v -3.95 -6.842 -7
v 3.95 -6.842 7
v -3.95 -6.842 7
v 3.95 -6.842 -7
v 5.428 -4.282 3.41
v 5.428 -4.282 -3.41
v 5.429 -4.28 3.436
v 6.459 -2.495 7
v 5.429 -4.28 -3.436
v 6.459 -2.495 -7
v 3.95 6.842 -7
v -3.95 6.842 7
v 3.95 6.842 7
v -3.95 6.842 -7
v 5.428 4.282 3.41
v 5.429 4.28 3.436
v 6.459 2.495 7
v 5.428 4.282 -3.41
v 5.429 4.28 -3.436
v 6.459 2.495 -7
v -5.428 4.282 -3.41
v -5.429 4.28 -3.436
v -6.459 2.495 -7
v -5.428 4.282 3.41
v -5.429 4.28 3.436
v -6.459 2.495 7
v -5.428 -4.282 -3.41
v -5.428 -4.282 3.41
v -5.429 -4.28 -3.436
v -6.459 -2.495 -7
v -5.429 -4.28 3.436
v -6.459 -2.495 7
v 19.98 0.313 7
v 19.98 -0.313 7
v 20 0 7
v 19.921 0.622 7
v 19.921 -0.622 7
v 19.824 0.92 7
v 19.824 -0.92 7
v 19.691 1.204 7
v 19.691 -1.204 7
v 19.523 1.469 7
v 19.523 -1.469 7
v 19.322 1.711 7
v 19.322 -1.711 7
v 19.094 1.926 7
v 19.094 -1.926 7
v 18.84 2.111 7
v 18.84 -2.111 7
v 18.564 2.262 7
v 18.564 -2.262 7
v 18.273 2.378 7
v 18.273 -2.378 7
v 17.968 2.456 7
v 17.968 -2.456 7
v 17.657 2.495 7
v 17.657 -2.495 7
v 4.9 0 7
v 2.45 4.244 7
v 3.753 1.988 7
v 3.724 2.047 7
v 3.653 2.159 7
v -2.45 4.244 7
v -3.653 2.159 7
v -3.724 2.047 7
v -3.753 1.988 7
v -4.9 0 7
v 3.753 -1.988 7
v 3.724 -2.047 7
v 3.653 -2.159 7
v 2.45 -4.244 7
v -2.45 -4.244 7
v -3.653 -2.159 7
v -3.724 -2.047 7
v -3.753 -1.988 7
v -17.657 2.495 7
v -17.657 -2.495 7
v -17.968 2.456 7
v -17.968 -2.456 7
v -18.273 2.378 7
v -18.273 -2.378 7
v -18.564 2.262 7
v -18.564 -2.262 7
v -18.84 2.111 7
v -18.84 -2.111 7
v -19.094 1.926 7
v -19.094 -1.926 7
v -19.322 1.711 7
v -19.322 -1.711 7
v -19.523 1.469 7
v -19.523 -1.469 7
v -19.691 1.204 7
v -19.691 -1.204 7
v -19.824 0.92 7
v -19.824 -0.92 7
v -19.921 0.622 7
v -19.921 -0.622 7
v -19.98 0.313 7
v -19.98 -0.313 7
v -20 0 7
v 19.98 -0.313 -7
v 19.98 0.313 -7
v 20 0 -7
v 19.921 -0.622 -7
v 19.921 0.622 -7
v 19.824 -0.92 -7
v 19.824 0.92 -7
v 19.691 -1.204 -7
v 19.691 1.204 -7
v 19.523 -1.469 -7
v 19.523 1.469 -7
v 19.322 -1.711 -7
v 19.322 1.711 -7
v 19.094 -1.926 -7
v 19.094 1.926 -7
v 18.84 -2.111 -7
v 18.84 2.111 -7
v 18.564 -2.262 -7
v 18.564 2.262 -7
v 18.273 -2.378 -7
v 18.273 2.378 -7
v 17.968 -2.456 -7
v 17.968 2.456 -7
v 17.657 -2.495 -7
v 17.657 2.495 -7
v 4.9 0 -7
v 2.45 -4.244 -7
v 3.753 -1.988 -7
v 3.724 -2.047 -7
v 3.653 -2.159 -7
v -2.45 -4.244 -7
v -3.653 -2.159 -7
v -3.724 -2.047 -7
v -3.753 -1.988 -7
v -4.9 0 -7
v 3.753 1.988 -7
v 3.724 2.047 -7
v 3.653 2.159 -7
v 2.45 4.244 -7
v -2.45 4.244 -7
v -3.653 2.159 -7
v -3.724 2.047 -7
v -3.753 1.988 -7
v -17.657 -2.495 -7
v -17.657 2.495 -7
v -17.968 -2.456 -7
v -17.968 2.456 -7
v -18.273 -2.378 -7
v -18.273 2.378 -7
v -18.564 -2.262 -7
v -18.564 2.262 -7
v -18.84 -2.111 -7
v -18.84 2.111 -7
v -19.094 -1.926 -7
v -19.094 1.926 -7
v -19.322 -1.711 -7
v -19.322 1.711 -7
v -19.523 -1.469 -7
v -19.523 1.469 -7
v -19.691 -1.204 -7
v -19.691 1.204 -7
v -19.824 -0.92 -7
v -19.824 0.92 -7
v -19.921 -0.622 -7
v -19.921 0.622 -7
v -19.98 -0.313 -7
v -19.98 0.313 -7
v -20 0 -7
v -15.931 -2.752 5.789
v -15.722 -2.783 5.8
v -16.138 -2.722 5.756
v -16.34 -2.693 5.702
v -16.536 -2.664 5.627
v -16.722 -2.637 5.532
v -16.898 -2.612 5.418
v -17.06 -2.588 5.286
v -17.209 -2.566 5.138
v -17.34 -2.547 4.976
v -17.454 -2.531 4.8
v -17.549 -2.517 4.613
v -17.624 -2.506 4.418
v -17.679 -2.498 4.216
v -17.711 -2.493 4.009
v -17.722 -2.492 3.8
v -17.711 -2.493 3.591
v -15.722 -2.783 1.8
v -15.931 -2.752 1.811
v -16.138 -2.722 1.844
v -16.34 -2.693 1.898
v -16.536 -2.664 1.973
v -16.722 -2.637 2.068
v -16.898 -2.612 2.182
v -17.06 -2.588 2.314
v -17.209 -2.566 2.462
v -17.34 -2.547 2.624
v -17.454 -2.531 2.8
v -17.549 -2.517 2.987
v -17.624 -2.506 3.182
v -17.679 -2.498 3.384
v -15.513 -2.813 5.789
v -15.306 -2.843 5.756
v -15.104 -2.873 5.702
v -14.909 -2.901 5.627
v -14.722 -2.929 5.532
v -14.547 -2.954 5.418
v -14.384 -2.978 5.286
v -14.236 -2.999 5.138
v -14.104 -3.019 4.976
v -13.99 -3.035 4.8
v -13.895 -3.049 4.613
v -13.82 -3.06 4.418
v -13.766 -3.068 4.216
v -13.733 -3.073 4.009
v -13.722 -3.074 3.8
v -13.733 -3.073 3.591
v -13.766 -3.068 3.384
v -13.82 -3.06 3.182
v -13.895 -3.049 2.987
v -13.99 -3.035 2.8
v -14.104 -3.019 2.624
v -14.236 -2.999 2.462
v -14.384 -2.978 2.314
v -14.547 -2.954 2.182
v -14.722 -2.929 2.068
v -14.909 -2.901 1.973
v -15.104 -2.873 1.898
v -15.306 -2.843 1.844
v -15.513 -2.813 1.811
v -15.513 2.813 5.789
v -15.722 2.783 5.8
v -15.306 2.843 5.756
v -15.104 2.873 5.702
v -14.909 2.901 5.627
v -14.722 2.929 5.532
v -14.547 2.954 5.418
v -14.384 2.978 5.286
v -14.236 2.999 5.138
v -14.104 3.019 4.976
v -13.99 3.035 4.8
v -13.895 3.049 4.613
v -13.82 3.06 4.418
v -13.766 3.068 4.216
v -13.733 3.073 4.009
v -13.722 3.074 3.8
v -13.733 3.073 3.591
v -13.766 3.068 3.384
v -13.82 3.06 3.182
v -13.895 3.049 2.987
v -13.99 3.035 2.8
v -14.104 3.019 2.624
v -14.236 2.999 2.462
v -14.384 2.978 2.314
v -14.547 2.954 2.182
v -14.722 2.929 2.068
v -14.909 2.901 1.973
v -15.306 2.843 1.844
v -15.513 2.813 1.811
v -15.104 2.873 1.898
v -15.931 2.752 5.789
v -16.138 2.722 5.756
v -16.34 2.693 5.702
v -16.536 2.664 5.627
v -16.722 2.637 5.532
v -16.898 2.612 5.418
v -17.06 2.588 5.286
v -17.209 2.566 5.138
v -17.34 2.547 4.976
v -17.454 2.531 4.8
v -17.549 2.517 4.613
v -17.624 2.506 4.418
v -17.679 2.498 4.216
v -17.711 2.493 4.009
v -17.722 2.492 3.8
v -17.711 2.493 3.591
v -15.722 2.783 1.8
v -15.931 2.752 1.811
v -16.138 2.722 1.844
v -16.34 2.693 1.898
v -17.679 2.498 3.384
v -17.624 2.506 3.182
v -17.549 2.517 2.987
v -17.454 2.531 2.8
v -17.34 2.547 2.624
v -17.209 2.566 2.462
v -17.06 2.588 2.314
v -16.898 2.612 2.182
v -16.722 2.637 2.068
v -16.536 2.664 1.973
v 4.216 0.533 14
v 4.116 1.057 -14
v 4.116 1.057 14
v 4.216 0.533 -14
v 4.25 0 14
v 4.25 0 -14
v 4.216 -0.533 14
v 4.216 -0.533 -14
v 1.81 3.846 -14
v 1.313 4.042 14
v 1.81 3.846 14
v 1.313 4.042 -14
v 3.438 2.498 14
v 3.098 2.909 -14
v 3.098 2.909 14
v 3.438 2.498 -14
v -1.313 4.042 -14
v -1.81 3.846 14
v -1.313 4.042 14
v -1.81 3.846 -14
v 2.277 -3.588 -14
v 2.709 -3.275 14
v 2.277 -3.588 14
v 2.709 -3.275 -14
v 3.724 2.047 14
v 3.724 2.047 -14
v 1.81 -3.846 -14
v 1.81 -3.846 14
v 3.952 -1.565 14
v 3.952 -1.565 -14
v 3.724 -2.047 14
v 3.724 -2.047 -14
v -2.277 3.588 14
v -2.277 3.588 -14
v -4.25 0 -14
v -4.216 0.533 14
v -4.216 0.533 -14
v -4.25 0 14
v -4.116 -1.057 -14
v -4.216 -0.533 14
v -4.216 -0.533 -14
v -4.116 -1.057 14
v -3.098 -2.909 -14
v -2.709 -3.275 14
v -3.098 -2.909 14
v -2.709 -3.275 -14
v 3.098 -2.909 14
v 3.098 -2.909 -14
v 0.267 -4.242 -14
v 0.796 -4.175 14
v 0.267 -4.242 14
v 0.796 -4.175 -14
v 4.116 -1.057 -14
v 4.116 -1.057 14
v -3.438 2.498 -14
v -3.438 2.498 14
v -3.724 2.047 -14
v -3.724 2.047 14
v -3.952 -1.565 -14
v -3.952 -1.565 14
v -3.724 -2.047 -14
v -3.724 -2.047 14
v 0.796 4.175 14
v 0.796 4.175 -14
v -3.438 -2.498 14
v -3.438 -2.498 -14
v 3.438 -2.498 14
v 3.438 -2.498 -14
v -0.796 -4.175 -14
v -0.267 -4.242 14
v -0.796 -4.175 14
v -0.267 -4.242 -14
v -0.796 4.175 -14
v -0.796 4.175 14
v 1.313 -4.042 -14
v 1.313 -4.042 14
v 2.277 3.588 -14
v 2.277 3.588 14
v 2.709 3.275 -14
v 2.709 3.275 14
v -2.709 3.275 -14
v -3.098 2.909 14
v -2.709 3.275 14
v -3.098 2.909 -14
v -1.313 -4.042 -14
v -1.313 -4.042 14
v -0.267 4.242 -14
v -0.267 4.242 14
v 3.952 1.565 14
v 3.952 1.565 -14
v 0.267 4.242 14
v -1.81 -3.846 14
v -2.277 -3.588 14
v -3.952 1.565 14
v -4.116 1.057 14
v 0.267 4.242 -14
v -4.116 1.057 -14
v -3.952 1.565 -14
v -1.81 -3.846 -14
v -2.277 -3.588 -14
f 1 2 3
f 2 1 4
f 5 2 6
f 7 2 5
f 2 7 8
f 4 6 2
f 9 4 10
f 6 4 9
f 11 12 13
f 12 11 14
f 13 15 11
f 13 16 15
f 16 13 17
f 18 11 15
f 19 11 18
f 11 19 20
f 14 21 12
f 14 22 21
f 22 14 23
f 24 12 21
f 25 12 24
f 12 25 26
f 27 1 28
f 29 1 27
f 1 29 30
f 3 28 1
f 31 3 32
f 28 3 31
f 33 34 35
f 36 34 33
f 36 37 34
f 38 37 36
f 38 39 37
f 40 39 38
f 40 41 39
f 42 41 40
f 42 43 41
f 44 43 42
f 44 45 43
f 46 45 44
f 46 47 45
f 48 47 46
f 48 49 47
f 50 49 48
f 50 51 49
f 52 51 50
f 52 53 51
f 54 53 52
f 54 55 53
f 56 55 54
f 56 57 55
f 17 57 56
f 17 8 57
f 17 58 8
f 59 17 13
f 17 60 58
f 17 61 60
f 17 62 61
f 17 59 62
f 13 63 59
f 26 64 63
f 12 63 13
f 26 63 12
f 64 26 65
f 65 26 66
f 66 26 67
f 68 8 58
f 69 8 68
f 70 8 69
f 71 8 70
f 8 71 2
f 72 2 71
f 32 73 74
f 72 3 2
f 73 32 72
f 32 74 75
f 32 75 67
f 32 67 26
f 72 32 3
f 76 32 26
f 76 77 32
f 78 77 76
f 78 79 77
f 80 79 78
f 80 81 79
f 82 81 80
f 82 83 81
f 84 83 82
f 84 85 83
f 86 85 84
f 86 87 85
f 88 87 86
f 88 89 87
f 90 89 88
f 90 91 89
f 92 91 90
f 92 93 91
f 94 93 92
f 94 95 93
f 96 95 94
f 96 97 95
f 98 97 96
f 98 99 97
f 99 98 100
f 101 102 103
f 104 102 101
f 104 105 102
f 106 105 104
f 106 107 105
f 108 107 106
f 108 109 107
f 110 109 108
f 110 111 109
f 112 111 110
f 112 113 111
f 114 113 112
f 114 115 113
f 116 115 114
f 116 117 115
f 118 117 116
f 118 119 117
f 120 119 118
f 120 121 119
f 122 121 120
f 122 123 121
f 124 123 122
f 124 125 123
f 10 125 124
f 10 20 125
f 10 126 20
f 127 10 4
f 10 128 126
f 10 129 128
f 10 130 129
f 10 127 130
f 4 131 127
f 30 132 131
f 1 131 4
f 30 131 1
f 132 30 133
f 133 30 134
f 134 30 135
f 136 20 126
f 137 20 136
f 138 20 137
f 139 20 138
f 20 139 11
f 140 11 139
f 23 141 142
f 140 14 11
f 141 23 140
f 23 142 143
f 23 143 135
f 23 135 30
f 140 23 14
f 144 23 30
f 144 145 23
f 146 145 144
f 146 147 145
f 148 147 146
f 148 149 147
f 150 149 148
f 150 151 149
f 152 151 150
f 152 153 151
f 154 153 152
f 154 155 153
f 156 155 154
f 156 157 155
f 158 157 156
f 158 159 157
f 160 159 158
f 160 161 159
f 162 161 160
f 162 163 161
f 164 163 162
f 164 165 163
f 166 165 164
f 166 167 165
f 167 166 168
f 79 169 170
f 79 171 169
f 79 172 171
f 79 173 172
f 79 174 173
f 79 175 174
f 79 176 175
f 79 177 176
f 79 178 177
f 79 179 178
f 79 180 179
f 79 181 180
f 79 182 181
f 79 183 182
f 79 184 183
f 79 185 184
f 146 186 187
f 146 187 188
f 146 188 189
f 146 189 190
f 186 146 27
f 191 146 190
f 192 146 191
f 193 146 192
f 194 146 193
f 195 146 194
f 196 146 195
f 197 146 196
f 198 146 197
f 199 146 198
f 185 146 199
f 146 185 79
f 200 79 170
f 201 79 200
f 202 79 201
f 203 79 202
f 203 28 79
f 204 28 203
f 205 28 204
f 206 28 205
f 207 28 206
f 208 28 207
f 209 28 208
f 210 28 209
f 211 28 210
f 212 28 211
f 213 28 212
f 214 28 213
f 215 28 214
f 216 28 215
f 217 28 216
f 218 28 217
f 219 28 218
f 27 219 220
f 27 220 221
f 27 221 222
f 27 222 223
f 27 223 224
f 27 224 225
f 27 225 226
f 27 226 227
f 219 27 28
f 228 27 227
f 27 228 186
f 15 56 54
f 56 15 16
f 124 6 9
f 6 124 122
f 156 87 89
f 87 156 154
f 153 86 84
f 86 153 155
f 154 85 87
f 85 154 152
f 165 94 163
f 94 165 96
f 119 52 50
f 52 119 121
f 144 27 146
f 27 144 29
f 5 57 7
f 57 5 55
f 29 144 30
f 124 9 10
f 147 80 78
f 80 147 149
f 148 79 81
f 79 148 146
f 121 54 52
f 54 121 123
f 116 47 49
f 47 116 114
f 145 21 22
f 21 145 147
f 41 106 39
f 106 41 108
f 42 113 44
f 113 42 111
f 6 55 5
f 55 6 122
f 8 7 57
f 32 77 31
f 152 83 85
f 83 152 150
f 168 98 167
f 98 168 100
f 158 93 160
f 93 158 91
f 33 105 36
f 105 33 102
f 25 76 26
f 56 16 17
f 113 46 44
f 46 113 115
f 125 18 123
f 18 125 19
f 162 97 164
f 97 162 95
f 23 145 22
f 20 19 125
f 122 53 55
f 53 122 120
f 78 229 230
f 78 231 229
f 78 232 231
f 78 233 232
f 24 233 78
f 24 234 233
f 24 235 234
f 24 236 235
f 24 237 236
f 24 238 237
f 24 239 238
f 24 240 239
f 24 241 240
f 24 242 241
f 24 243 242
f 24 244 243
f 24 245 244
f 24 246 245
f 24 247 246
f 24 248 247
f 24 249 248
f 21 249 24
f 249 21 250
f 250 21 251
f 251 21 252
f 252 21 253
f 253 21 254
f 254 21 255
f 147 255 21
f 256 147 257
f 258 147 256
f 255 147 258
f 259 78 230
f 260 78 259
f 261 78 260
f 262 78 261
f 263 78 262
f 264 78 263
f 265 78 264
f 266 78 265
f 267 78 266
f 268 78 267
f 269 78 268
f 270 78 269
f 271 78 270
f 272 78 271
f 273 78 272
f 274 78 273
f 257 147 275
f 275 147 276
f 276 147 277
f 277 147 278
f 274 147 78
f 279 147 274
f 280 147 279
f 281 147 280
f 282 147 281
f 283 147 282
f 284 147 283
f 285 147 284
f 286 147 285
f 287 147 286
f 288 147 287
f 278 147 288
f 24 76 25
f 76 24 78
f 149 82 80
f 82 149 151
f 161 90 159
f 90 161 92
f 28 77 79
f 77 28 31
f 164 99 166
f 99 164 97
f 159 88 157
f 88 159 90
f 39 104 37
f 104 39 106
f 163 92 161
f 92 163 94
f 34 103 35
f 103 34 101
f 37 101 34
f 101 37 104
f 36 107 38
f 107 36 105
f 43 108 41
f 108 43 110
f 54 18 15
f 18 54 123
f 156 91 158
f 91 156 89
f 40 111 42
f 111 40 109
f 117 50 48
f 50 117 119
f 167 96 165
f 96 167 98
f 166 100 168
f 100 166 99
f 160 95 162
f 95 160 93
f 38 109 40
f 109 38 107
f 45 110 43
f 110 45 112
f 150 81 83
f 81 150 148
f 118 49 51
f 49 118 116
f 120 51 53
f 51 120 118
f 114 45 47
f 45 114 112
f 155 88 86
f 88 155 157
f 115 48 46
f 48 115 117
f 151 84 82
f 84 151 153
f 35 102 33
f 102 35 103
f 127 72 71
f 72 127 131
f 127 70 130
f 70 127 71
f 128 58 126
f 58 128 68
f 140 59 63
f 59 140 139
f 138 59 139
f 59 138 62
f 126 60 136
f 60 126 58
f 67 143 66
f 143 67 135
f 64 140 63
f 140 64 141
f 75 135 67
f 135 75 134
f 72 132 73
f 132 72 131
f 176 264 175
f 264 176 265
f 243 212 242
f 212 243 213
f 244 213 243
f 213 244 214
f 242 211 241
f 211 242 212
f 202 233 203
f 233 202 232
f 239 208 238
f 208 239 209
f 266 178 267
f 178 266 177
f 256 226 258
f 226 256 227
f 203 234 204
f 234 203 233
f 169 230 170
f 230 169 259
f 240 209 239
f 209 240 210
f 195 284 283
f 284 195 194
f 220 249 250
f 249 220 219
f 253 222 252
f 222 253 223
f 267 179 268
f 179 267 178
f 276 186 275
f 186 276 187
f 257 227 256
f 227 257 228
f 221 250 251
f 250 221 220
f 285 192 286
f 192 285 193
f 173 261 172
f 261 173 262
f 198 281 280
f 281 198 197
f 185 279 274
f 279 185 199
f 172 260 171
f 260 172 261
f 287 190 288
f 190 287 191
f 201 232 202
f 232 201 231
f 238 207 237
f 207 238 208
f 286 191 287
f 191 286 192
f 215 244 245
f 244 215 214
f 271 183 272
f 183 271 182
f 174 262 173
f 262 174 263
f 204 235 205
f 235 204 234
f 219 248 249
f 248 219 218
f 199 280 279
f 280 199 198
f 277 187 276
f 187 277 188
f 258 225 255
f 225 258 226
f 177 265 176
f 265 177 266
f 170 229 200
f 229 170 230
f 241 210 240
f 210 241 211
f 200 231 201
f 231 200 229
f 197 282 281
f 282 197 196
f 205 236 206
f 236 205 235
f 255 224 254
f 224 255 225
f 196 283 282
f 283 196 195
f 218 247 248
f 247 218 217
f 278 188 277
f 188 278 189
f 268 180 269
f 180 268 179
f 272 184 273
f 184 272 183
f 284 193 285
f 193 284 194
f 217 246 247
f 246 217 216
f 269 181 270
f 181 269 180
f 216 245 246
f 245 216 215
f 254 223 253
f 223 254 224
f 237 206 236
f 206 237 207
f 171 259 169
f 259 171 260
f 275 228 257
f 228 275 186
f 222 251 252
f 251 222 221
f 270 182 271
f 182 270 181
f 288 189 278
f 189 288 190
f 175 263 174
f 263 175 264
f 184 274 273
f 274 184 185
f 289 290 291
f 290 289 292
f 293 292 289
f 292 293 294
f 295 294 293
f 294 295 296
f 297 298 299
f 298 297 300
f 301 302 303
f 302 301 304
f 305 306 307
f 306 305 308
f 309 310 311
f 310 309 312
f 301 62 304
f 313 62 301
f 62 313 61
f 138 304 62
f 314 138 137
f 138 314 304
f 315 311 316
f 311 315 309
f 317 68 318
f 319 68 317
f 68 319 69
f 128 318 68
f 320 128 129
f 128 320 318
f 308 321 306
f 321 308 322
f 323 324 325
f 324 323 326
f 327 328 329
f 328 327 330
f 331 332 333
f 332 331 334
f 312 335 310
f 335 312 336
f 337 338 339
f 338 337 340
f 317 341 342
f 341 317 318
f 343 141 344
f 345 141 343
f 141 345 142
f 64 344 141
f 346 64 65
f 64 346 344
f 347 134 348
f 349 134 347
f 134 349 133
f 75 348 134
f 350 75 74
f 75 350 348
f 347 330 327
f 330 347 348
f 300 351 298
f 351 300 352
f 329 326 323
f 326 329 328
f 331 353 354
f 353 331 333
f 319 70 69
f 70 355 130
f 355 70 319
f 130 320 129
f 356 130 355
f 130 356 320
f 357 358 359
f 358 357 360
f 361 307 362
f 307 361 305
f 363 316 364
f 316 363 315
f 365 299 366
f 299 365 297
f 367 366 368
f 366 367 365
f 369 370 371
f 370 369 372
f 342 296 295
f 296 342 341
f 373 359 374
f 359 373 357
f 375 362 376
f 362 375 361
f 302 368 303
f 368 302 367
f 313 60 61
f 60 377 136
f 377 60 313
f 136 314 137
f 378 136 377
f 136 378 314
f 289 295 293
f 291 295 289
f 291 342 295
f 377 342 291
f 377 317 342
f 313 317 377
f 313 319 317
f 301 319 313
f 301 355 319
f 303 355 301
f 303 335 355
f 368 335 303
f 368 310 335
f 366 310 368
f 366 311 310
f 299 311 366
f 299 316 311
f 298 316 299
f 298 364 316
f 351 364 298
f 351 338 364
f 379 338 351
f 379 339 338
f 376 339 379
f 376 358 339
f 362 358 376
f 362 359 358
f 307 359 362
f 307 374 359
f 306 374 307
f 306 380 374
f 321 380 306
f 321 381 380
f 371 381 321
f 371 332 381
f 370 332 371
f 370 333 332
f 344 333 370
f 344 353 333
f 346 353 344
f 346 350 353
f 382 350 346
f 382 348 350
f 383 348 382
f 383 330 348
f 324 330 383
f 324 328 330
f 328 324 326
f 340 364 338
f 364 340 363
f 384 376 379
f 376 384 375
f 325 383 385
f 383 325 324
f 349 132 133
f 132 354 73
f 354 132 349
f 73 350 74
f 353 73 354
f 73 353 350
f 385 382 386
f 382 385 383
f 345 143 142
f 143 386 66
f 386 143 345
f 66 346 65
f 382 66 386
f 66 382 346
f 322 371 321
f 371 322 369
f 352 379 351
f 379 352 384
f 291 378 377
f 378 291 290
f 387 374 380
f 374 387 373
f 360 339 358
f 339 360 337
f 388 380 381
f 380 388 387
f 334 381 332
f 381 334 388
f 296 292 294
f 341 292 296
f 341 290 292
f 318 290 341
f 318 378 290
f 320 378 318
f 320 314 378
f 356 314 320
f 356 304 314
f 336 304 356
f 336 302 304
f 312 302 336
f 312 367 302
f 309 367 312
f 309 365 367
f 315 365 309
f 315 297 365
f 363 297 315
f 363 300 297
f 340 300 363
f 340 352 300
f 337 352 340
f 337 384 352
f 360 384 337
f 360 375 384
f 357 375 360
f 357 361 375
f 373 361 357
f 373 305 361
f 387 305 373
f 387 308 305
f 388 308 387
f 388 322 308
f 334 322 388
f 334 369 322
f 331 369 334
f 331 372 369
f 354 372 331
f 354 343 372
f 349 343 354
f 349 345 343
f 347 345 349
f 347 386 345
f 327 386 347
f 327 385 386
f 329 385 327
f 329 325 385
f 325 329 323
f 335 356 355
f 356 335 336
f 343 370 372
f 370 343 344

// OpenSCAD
/*
    Customizable Two-Sided Keyring Thumb Spanner
    
    Set the 'testing' variable to 1 and then use the test_diameter variable to help you size the edge to edge diameter (upper_dia/lower_dia) to get the correct size for your spanner. Add in some tolerance for material shrinkage.
    
    Try to keep the lower_dia variable as your smaller spanner to avoid needing support. Remember to add tolerance for any shrinking you get, it can be worse closer to the heated bed.
    
    - by Harlo
    - 22/05/2016.
    
        ADDING TEXT:
    
        *   Don't forget to add in a reference to your desired font. Use variable 'font_var' to load your desired font into all the text modules automatically.
        **  Uncomment the text modules and the cutting references if you plan on adding them in.
        *** There are two text versions/options in the wrench_outer() module. Either use both the text_8mm (lower) & text_10mm (upper) modules together OR the text_any_mm(). Avoid using both.
*/

//Set to '0' for your final render
testing = 1; //[0,1]
//Edge to Edge Length
test_diameter = 8.5; //[0.1:0.1:20]
//Main Diameter Upper - set to accomodate the tube
upper_dia = 9.8; // [0.5:0.1:30]
//Main Diameter Lower - set to accomodate the tube
lower_dia = 9.8; //[0.5:0.1:30]
//Main Handle Thickness
handle_thickness = 5; //[5:0.1:20]
//Secondary Handle Thickness
handle_thickness_2 = 10; //[0:0.1:40]
//Wall thickness (around the nut)
additional_thickness = 3; //[2:0.1:15]
//Z Height
height = 14; //[3:0.1:60]
//Length of the handle
length = 35; //[25:0.1:100]




//Internal

key_ring_dia = 4*1;
key_ring_z_scale = 1*1;
key_ring_res = 60*1;



wrench_outer();

if (testing == 1){
    test_cut_cylinder();
}

/*
module text_10mm(){
    translate([0,-(upper_dia+additional_thickness)/2,height/4]){
        rotate([270,0,180]){
            text_module("8", 4.5);
        }
    }
}

module text_8mm(){
    translate([0,-(upper_dia+additional_thickness)/2,-height/4]){
        rotate([270,0,180]){
            text_module("8", 4.5);
        }
    }
}

module text_any_mm(){
    translate([0,-(upper_dia+additional_thickness)/2,0]){
        rotate([270,0,180]){
            text_module(label, label_size);
        }
    }
}

module text_module(text_in, text_size){
    scale([1,1,0.01])
    {
        linear_extrude(h = 1, center = true, convexity = 4) {
            text (text_in, size = text_size,font = font_var, halign = "center", valign = "center", $fn = 32 );
        }
    }
}

*/
          

module wrench_outer(){
    difference(){
        union(){
            cylinder(h = height ,d = upper_dia + additional_thickness*2, center = true, $fn = 6);
            handles();
            
        }
        inner_cuts();
        key_ring_cut();        
        //text_10mm(); //TOP
        //text_8mm(); //BOTTOM
        //text_any_mm(); //CENTER
    }
}



module test_cut_cylinder(){
      cylinder(h = height*2 ,d = test_diameter, center = true, $fn = 50);
}


module key_ring_cut(){
    translate([-length/2 + key_ring_dia/2.25,0,height/2 - (key_ring_dia * key_ring_z_scale)/1.25]){
        rotate([90,0,0]){
            scale([1,key_ring_z_scale,1]){
                cylinder(h = handle_thickness*2, d = key_ring_dia, center = true, $fn = key_ring_res);
            }
        }
    }
    
}


module handles(){
    hull(){
        translate([-length/2,0,0]){
            cylinder(h = height, d = handle_thickness, center = true, $fn = 50);
        }
        translate([length/2,0,0]){
            cylinder(h = height, d = handle_thickness, center = true, $fn = 50);
        }
        
        translate([0,0,2]){
            rotate([0,90,0]){    
                cylinder(h = 1, d = handle_thickness_2, center = true, $fn = 4);
            }
        }
        translate([0,0,-2]){
            rotate([0,90,0]){    
                cylinder(h = 1, d = handle_thickness_2, center = true, $fn = 4);
            }
        }
        
    }
}

module inner_cuts(){
    translate([0,0,height/2]){
        cylinder (h = height, d = upper_dia, center = true, $fn = 6);
    }
    
    translate([0,0,-height/2]){
        cylinder (h = height, d = lower_dia, center = true, $fn = 6);
    }
}
